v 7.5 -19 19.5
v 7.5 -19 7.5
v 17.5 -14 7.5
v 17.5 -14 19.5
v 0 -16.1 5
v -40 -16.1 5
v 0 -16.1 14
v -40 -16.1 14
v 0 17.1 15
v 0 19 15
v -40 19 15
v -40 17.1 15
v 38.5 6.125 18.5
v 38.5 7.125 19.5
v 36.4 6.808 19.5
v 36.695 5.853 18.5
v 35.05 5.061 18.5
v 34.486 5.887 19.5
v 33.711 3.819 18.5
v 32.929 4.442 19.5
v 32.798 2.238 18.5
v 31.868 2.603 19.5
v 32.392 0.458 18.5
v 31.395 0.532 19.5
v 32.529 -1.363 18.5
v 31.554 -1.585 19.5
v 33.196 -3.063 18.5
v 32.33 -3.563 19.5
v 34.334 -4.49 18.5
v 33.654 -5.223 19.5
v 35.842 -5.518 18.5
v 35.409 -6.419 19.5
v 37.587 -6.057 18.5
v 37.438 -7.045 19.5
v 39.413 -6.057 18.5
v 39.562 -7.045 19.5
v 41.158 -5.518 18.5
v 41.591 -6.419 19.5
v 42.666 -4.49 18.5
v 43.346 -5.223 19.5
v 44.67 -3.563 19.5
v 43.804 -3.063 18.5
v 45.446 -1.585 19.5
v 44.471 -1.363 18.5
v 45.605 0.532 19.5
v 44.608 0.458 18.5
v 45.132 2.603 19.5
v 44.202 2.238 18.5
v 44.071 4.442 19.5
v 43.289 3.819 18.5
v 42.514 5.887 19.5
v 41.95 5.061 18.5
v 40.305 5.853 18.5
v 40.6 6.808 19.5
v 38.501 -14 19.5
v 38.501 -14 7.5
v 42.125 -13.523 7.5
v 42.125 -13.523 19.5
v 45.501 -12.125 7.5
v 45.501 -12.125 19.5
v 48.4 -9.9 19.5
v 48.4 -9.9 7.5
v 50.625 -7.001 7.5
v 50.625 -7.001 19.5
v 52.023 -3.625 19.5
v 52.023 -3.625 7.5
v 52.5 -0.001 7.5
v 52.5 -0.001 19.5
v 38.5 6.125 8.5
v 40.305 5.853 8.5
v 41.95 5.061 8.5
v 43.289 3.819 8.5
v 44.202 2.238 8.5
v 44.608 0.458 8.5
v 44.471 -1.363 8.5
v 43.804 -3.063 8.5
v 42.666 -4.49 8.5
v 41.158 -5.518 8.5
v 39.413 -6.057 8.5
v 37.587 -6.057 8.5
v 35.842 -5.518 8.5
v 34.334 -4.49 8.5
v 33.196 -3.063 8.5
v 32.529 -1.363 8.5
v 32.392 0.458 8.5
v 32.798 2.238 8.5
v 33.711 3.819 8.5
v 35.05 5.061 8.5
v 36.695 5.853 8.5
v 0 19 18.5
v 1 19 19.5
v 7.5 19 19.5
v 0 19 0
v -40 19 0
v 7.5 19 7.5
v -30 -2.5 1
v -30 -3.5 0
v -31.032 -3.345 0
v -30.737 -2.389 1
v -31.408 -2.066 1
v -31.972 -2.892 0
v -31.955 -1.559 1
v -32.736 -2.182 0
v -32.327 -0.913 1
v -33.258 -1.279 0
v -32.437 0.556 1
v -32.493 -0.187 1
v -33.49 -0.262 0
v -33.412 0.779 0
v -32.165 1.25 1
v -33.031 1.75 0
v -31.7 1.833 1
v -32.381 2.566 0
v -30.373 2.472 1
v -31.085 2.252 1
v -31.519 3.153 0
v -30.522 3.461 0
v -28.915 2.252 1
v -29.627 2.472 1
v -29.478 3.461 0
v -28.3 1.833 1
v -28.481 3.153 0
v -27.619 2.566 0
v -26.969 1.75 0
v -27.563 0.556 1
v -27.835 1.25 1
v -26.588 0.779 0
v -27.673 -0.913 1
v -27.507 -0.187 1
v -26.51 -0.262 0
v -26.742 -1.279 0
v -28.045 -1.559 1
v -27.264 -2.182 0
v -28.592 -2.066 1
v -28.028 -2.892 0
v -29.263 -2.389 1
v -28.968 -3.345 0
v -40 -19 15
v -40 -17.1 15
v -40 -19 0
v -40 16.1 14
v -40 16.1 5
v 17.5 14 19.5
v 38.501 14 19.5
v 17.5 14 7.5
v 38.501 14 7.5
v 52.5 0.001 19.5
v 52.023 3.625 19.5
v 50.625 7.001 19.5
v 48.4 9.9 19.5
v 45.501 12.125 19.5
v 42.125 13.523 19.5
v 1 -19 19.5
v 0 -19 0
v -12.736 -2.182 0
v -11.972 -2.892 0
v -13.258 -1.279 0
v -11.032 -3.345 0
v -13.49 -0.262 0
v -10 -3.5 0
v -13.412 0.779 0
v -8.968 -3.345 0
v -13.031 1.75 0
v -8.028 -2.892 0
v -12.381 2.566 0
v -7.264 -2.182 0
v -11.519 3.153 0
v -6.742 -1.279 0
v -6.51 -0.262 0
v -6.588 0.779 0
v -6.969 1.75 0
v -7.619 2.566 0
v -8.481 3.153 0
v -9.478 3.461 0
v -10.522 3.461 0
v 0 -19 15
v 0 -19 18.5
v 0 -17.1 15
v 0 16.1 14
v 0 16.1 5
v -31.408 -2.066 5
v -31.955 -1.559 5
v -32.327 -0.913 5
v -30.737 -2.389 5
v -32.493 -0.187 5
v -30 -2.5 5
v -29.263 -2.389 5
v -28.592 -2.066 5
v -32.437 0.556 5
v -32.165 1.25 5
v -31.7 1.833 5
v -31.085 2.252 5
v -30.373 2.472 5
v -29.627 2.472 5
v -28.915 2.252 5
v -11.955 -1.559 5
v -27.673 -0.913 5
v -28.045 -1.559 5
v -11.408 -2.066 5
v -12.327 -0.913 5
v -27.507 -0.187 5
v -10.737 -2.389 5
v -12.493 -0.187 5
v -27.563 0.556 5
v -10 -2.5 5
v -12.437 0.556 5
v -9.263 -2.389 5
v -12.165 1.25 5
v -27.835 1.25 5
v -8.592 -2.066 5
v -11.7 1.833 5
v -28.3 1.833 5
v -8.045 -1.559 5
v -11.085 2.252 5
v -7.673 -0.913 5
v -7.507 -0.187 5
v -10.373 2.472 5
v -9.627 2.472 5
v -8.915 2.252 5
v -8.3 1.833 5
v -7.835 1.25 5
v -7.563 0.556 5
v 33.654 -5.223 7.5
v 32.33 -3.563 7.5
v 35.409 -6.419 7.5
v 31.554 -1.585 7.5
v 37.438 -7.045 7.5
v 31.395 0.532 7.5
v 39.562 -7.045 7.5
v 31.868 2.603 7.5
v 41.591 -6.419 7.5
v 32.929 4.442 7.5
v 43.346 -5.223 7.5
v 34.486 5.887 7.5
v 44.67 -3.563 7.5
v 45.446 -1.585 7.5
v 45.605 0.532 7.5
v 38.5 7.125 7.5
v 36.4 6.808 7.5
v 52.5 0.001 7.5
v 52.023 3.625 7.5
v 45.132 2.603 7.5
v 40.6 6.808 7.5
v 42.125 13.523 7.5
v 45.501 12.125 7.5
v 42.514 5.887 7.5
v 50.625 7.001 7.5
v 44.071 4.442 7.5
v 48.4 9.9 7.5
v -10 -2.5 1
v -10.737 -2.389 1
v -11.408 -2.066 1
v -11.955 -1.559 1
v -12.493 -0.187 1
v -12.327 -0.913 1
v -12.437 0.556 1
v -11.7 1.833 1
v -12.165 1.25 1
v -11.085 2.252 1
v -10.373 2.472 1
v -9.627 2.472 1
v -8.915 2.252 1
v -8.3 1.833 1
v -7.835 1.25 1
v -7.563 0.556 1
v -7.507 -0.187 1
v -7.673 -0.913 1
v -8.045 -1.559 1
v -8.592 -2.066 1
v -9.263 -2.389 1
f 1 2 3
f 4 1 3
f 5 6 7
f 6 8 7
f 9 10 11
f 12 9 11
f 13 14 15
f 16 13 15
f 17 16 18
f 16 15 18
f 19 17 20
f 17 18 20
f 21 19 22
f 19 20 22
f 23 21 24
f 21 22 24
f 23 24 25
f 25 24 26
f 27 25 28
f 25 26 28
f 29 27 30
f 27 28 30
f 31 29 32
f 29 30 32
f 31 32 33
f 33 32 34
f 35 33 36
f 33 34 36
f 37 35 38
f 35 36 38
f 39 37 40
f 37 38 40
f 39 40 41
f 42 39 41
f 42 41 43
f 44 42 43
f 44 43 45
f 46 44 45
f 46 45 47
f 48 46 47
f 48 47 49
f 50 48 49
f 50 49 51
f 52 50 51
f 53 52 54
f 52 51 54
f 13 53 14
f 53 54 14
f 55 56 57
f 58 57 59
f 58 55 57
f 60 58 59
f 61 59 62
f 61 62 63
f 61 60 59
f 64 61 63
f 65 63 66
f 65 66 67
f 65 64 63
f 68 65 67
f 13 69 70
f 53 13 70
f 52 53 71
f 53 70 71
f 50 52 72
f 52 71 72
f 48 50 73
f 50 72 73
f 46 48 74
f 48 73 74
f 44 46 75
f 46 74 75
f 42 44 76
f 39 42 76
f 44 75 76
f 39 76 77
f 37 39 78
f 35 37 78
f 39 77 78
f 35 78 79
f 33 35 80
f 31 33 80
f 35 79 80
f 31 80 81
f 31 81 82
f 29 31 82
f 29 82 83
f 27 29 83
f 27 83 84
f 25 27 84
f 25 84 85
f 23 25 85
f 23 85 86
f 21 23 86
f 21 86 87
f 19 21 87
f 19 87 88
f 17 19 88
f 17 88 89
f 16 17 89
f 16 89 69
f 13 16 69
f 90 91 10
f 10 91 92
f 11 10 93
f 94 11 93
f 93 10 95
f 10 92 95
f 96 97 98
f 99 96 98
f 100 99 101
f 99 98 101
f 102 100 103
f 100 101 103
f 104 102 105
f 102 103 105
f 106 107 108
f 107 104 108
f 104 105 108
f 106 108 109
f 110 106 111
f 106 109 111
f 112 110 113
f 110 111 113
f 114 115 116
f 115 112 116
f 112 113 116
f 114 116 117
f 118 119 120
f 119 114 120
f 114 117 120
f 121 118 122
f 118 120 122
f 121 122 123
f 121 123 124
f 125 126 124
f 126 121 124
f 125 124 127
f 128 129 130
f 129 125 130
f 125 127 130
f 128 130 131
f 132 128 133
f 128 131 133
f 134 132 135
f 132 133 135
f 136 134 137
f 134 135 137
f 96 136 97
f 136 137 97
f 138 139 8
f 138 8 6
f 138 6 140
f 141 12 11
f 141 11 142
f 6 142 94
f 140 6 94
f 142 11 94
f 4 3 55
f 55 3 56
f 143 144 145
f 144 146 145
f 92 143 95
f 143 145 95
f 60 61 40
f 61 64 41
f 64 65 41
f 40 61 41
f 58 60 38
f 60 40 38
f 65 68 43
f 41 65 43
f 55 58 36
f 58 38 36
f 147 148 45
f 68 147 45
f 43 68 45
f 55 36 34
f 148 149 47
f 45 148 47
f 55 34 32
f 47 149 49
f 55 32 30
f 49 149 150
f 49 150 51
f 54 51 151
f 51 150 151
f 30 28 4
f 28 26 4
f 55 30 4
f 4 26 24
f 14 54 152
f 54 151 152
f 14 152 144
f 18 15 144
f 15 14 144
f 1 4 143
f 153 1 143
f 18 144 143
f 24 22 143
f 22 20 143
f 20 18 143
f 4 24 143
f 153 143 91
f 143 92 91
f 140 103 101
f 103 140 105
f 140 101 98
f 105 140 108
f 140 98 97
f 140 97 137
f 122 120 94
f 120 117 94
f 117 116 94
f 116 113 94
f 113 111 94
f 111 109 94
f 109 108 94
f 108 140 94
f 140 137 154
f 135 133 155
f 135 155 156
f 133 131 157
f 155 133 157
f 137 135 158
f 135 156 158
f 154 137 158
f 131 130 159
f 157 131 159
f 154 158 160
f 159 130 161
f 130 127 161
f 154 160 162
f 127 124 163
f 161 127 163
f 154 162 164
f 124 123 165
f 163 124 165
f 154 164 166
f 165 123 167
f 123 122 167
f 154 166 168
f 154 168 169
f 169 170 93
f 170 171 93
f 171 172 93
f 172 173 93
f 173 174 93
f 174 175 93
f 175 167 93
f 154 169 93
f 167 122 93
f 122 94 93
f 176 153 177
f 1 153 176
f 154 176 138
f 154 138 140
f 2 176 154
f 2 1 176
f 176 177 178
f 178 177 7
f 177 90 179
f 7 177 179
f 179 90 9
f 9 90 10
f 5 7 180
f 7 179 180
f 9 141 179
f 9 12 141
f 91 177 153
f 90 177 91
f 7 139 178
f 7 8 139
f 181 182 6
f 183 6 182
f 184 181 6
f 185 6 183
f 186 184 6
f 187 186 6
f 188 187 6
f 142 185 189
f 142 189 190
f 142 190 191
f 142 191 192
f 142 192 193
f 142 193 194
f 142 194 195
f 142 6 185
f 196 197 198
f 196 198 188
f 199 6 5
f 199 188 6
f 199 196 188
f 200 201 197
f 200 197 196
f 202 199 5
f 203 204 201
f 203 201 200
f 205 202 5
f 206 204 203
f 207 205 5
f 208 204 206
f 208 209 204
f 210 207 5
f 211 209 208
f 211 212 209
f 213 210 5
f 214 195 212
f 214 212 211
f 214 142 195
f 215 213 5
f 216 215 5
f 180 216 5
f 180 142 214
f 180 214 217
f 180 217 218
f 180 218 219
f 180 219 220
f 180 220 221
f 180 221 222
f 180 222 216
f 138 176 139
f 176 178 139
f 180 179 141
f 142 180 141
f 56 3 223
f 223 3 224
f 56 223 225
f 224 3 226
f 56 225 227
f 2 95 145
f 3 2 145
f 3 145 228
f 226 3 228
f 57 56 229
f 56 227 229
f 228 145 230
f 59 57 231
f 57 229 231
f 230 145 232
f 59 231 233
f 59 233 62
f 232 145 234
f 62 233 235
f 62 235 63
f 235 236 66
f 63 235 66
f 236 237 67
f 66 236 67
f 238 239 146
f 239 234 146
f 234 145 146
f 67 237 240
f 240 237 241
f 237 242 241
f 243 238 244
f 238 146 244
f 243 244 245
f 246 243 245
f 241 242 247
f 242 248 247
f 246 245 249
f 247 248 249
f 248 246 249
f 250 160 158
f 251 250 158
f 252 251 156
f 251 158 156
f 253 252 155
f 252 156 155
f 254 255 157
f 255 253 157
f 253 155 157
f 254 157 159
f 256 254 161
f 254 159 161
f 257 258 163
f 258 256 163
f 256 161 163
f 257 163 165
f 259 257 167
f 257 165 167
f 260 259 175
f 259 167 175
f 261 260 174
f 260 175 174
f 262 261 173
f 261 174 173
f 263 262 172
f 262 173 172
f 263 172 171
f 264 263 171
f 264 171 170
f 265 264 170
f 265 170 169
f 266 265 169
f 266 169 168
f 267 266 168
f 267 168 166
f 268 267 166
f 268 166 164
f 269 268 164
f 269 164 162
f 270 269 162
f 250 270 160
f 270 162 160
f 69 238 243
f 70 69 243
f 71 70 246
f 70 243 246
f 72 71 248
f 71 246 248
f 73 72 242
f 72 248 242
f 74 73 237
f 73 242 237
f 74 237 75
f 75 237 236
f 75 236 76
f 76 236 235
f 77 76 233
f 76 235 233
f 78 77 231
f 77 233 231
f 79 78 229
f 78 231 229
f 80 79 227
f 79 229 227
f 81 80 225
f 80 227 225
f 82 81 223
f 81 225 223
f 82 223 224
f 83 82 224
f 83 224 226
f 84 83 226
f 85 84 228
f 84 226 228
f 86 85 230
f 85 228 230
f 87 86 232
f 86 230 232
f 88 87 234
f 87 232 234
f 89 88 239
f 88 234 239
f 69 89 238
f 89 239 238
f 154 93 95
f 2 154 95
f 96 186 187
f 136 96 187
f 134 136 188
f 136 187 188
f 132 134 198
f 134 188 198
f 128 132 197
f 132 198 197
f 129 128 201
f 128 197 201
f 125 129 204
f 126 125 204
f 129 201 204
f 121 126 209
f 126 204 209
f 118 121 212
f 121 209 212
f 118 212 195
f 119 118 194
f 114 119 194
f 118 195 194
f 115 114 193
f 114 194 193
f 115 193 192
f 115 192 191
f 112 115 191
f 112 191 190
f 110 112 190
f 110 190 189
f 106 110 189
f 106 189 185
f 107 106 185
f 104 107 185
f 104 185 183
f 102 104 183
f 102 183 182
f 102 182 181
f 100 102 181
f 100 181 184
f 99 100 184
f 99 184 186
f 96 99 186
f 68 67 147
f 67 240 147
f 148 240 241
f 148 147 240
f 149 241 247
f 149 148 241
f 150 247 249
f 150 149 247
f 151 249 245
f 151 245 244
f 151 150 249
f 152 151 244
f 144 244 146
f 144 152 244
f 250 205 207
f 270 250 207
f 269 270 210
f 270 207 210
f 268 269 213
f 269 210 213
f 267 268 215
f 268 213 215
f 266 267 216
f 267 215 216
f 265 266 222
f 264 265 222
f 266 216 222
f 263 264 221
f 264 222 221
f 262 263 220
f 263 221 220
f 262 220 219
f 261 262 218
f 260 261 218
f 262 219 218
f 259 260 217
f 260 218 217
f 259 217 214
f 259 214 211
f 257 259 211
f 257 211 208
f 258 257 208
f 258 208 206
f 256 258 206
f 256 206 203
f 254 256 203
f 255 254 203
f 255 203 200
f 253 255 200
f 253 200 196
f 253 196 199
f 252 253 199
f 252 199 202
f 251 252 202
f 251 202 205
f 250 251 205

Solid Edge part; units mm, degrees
sketch "Sketch1" plane through (0, 0, 0) normal (0, -1, 0) x (1, 0, 0)
  line L0 (-40, 15) -> (-40, 0)
  line L1 (-40, 0) -> (0, 0)
  line L2 (0, 0) -> (7.5, 7.5)
  line L3 (7.5, 7.5) -> (52.5, 7.5)
  line L4 (52.5, 7.5) -> (52.5, 19.5)
  line L5 (52.5, 19.5) -> (0, 19.5)
  line L6 (0, 19.5) -> (0, 15)
  line L7 (0, 15) -> (-40, 15)
  dimension "D1" = 7.5
  dimension "D2" = 15
  dimension "D3" = 12
  dimension "D4" = 40
  dimension "D5" = 45
extrude "Protrusion1" add sketch "Sketch1" along normal mid plane 38
sketch "Sketch2" plane through (-10, -18, 15) normal (0, 0, 1) x (1, 0, 0)
  line L0 (10, 34.1) -> (-30, 34.1)
  line L1 (-30, 34.1) -> (-30, 1.9)
  line L2 (-30, 1.9) -> (10, 1.9)
  line L3 (10, 1.9) -> (10, 34.1)
  dimension "D1" = 32.2
extrude "ExtrudedCutout_1" cut sketch "Sketch2" against normal blind 10
sketch "Sketch3" plane through (25, 0, 7.5) normal (0, 0, -1) x (1, 0, 0)
  line L0 (-17.5, 19) -> (-7.5, 14)
  line L1 (-7.5, 14) -> (27.5, 14)
  line L2 (27.5, 14) -> (27.5, -14)
  line L3 (27.5, -14) -> (-7.5, -14)
  line L4 (-7.5, -14) -> (-17.5, -19)
  dimension "D1" = 10
  dimension "D2" = 5
extrude "ExtrudedCutout_2" cut sketch "Sketch3" against normal blind 41 material side at (12.5224, -16.5447, 7.5)
fillet "Round1" radius 14 2 edges at (52.5, 14, 13.5) (52.5, -14, 13.5)
hole "Hole_1" at (38.5, 0, 7.5) direction (0, 0, 1) diameter 12.25 end up to next
hole "Hole_2" at (-10, 0, 5) direction (0, 0, -1) diameter 5 end up to next
hole "Hole1" at (-30, 0, 5) direction (0, 0, -1) diameter 5 end up to next
chamfer "Chamfer1" distance 1 angle 45 4 edges at (38.5, -6.125, 7.5) (44.625, 0, 19.5) (-12.5, 0, 0) (-32.5, 0, 0)
chamfer "Chamfer_2" distance 1 angle 45 3 edges at (-20, 16.1, 15) (-20, -16.1, 15) (0, 0, 19.5)
properties material "Polyethylene, low density"
